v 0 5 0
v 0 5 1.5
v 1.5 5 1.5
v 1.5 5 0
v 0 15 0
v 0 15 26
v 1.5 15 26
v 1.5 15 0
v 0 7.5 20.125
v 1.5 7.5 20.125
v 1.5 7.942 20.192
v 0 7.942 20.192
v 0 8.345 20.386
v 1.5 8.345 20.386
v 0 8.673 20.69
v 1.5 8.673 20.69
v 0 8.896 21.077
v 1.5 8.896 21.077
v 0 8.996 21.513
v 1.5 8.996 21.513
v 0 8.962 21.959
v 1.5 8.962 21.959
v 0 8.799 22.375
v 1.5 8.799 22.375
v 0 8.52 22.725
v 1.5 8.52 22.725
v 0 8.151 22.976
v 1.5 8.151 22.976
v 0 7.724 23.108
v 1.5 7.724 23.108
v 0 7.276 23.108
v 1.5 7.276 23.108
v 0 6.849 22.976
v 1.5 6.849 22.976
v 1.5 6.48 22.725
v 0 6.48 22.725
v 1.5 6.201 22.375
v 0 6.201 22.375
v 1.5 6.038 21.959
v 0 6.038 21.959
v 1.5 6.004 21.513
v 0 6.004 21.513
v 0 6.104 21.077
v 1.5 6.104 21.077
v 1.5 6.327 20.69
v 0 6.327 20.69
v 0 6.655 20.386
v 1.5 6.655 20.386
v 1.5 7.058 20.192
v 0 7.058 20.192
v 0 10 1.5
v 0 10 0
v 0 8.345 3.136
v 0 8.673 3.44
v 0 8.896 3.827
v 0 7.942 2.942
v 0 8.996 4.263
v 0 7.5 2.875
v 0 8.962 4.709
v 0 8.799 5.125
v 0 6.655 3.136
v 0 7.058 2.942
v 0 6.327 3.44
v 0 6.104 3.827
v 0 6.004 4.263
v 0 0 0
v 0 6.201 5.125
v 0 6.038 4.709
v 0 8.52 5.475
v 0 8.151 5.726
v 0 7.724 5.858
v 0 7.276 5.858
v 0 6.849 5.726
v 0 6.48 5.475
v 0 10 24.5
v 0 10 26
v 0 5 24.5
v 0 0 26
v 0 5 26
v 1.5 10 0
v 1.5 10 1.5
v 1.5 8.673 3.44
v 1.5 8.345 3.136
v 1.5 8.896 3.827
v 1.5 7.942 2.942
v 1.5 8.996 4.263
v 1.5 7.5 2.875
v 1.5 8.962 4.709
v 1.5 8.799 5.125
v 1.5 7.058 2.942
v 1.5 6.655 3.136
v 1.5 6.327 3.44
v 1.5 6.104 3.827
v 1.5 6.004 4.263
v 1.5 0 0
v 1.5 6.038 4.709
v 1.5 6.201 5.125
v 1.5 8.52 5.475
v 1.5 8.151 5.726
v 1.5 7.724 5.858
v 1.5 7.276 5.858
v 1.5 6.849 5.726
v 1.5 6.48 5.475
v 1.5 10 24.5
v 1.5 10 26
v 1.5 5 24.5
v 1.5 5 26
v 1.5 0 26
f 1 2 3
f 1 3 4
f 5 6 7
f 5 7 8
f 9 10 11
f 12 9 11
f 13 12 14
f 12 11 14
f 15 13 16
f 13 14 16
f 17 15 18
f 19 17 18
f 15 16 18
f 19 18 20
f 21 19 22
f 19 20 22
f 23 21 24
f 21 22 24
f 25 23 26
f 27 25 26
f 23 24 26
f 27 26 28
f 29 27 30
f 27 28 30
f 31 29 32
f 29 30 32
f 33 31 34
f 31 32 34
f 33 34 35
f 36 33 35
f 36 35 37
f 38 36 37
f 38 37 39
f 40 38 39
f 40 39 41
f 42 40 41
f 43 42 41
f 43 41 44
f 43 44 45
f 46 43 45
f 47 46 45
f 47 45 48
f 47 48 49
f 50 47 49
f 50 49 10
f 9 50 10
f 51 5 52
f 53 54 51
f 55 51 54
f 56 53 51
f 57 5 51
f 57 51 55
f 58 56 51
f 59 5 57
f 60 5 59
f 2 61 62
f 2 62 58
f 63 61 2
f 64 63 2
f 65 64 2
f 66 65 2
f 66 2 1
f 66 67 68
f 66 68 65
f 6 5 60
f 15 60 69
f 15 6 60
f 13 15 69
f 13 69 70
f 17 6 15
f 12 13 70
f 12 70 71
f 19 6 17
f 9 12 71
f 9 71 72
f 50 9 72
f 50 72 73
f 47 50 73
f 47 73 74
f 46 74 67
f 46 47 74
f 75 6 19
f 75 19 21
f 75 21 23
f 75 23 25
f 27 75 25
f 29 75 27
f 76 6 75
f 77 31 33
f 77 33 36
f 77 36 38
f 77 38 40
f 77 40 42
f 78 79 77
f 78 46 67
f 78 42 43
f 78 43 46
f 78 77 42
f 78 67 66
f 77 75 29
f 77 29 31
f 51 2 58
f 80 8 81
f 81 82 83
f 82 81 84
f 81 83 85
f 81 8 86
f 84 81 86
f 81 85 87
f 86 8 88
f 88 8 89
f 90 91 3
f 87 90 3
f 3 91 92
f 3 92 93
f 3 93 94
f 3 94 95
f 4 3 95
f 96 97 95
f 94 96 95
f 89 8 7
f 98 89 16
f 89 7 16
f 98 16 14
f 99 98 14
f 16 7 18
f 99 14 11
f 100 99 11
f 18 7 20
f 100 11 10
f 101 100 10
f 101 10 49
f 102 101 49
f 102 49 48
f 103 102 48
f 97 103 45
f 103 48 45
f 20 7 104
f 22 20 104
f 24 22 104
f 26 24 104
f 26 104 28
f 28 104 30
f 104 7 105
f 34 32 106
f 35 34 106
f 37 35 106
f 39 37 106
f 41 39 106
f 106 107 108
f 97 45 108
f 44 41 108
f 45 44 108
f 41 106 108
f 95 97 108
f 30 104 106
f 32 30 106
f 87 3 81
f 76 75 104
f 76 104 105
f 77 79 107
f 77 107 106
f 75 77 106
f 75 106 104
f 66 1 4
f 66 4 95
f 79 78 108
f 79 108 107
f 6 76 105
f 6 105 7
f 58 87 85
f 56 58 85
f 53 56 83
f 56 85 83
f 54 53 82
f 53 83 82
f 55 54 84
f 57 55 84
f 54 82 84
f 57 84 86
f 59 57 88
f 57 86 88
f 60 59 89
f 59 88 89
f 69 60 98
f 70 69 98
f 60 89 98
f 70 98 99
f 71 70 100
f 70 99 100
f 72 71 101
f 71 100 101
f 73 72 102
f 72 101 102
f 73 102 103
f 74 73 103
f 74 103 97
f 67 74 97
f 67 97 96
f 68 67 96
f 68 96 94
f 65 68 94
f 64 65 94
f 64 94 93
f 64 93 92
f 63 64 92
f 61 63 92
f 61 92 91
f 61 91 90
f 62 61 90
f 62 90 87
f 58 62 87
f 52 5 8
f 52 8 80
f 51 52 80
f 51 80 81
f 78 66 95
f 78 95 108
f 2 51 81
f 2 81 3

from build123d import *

# Parameters (mm, degrees)
BOSS_EXTRUDE1_DEPTH = 1.5
SKETCH2_R           = 1.5
CUT_EXTRUDE1_DEPTH  = 31.054117854


with BuildPart() as part:
    # Sketch1 → Boss-Extrude1 (new body)
    with BuildSketch(Plane.YZ):
        Polygon((0, 0), (0, 26), (5, 26), (5, 24.5), (10, 24.5), (10, 26), (15, 26), (15, 0), (10, 0), (10, 1.5), (5, 1.5), (5, 0), align=None)
    extrude(amount=BOSS_EXTRUDE1_DEPTH)

    # Sketch2 → Cut-Extrude1 (cut, through all)
    with BuildSketch(Plane.YZ.offset(1.5)):
        with Locations(Location((7.5, 21.625, 0), (0, 0, 270))):
            Circle(SKETCH2_R)
        with Locations(Location((7.5, 4.375, 0), (0, 0, 270))):
            Circle(SKETCH2_R)
    extrude(amount=-CUT_EXTRUDE1_DEPTH, mode=Mode.SUBTRACT)


solid = part.part
